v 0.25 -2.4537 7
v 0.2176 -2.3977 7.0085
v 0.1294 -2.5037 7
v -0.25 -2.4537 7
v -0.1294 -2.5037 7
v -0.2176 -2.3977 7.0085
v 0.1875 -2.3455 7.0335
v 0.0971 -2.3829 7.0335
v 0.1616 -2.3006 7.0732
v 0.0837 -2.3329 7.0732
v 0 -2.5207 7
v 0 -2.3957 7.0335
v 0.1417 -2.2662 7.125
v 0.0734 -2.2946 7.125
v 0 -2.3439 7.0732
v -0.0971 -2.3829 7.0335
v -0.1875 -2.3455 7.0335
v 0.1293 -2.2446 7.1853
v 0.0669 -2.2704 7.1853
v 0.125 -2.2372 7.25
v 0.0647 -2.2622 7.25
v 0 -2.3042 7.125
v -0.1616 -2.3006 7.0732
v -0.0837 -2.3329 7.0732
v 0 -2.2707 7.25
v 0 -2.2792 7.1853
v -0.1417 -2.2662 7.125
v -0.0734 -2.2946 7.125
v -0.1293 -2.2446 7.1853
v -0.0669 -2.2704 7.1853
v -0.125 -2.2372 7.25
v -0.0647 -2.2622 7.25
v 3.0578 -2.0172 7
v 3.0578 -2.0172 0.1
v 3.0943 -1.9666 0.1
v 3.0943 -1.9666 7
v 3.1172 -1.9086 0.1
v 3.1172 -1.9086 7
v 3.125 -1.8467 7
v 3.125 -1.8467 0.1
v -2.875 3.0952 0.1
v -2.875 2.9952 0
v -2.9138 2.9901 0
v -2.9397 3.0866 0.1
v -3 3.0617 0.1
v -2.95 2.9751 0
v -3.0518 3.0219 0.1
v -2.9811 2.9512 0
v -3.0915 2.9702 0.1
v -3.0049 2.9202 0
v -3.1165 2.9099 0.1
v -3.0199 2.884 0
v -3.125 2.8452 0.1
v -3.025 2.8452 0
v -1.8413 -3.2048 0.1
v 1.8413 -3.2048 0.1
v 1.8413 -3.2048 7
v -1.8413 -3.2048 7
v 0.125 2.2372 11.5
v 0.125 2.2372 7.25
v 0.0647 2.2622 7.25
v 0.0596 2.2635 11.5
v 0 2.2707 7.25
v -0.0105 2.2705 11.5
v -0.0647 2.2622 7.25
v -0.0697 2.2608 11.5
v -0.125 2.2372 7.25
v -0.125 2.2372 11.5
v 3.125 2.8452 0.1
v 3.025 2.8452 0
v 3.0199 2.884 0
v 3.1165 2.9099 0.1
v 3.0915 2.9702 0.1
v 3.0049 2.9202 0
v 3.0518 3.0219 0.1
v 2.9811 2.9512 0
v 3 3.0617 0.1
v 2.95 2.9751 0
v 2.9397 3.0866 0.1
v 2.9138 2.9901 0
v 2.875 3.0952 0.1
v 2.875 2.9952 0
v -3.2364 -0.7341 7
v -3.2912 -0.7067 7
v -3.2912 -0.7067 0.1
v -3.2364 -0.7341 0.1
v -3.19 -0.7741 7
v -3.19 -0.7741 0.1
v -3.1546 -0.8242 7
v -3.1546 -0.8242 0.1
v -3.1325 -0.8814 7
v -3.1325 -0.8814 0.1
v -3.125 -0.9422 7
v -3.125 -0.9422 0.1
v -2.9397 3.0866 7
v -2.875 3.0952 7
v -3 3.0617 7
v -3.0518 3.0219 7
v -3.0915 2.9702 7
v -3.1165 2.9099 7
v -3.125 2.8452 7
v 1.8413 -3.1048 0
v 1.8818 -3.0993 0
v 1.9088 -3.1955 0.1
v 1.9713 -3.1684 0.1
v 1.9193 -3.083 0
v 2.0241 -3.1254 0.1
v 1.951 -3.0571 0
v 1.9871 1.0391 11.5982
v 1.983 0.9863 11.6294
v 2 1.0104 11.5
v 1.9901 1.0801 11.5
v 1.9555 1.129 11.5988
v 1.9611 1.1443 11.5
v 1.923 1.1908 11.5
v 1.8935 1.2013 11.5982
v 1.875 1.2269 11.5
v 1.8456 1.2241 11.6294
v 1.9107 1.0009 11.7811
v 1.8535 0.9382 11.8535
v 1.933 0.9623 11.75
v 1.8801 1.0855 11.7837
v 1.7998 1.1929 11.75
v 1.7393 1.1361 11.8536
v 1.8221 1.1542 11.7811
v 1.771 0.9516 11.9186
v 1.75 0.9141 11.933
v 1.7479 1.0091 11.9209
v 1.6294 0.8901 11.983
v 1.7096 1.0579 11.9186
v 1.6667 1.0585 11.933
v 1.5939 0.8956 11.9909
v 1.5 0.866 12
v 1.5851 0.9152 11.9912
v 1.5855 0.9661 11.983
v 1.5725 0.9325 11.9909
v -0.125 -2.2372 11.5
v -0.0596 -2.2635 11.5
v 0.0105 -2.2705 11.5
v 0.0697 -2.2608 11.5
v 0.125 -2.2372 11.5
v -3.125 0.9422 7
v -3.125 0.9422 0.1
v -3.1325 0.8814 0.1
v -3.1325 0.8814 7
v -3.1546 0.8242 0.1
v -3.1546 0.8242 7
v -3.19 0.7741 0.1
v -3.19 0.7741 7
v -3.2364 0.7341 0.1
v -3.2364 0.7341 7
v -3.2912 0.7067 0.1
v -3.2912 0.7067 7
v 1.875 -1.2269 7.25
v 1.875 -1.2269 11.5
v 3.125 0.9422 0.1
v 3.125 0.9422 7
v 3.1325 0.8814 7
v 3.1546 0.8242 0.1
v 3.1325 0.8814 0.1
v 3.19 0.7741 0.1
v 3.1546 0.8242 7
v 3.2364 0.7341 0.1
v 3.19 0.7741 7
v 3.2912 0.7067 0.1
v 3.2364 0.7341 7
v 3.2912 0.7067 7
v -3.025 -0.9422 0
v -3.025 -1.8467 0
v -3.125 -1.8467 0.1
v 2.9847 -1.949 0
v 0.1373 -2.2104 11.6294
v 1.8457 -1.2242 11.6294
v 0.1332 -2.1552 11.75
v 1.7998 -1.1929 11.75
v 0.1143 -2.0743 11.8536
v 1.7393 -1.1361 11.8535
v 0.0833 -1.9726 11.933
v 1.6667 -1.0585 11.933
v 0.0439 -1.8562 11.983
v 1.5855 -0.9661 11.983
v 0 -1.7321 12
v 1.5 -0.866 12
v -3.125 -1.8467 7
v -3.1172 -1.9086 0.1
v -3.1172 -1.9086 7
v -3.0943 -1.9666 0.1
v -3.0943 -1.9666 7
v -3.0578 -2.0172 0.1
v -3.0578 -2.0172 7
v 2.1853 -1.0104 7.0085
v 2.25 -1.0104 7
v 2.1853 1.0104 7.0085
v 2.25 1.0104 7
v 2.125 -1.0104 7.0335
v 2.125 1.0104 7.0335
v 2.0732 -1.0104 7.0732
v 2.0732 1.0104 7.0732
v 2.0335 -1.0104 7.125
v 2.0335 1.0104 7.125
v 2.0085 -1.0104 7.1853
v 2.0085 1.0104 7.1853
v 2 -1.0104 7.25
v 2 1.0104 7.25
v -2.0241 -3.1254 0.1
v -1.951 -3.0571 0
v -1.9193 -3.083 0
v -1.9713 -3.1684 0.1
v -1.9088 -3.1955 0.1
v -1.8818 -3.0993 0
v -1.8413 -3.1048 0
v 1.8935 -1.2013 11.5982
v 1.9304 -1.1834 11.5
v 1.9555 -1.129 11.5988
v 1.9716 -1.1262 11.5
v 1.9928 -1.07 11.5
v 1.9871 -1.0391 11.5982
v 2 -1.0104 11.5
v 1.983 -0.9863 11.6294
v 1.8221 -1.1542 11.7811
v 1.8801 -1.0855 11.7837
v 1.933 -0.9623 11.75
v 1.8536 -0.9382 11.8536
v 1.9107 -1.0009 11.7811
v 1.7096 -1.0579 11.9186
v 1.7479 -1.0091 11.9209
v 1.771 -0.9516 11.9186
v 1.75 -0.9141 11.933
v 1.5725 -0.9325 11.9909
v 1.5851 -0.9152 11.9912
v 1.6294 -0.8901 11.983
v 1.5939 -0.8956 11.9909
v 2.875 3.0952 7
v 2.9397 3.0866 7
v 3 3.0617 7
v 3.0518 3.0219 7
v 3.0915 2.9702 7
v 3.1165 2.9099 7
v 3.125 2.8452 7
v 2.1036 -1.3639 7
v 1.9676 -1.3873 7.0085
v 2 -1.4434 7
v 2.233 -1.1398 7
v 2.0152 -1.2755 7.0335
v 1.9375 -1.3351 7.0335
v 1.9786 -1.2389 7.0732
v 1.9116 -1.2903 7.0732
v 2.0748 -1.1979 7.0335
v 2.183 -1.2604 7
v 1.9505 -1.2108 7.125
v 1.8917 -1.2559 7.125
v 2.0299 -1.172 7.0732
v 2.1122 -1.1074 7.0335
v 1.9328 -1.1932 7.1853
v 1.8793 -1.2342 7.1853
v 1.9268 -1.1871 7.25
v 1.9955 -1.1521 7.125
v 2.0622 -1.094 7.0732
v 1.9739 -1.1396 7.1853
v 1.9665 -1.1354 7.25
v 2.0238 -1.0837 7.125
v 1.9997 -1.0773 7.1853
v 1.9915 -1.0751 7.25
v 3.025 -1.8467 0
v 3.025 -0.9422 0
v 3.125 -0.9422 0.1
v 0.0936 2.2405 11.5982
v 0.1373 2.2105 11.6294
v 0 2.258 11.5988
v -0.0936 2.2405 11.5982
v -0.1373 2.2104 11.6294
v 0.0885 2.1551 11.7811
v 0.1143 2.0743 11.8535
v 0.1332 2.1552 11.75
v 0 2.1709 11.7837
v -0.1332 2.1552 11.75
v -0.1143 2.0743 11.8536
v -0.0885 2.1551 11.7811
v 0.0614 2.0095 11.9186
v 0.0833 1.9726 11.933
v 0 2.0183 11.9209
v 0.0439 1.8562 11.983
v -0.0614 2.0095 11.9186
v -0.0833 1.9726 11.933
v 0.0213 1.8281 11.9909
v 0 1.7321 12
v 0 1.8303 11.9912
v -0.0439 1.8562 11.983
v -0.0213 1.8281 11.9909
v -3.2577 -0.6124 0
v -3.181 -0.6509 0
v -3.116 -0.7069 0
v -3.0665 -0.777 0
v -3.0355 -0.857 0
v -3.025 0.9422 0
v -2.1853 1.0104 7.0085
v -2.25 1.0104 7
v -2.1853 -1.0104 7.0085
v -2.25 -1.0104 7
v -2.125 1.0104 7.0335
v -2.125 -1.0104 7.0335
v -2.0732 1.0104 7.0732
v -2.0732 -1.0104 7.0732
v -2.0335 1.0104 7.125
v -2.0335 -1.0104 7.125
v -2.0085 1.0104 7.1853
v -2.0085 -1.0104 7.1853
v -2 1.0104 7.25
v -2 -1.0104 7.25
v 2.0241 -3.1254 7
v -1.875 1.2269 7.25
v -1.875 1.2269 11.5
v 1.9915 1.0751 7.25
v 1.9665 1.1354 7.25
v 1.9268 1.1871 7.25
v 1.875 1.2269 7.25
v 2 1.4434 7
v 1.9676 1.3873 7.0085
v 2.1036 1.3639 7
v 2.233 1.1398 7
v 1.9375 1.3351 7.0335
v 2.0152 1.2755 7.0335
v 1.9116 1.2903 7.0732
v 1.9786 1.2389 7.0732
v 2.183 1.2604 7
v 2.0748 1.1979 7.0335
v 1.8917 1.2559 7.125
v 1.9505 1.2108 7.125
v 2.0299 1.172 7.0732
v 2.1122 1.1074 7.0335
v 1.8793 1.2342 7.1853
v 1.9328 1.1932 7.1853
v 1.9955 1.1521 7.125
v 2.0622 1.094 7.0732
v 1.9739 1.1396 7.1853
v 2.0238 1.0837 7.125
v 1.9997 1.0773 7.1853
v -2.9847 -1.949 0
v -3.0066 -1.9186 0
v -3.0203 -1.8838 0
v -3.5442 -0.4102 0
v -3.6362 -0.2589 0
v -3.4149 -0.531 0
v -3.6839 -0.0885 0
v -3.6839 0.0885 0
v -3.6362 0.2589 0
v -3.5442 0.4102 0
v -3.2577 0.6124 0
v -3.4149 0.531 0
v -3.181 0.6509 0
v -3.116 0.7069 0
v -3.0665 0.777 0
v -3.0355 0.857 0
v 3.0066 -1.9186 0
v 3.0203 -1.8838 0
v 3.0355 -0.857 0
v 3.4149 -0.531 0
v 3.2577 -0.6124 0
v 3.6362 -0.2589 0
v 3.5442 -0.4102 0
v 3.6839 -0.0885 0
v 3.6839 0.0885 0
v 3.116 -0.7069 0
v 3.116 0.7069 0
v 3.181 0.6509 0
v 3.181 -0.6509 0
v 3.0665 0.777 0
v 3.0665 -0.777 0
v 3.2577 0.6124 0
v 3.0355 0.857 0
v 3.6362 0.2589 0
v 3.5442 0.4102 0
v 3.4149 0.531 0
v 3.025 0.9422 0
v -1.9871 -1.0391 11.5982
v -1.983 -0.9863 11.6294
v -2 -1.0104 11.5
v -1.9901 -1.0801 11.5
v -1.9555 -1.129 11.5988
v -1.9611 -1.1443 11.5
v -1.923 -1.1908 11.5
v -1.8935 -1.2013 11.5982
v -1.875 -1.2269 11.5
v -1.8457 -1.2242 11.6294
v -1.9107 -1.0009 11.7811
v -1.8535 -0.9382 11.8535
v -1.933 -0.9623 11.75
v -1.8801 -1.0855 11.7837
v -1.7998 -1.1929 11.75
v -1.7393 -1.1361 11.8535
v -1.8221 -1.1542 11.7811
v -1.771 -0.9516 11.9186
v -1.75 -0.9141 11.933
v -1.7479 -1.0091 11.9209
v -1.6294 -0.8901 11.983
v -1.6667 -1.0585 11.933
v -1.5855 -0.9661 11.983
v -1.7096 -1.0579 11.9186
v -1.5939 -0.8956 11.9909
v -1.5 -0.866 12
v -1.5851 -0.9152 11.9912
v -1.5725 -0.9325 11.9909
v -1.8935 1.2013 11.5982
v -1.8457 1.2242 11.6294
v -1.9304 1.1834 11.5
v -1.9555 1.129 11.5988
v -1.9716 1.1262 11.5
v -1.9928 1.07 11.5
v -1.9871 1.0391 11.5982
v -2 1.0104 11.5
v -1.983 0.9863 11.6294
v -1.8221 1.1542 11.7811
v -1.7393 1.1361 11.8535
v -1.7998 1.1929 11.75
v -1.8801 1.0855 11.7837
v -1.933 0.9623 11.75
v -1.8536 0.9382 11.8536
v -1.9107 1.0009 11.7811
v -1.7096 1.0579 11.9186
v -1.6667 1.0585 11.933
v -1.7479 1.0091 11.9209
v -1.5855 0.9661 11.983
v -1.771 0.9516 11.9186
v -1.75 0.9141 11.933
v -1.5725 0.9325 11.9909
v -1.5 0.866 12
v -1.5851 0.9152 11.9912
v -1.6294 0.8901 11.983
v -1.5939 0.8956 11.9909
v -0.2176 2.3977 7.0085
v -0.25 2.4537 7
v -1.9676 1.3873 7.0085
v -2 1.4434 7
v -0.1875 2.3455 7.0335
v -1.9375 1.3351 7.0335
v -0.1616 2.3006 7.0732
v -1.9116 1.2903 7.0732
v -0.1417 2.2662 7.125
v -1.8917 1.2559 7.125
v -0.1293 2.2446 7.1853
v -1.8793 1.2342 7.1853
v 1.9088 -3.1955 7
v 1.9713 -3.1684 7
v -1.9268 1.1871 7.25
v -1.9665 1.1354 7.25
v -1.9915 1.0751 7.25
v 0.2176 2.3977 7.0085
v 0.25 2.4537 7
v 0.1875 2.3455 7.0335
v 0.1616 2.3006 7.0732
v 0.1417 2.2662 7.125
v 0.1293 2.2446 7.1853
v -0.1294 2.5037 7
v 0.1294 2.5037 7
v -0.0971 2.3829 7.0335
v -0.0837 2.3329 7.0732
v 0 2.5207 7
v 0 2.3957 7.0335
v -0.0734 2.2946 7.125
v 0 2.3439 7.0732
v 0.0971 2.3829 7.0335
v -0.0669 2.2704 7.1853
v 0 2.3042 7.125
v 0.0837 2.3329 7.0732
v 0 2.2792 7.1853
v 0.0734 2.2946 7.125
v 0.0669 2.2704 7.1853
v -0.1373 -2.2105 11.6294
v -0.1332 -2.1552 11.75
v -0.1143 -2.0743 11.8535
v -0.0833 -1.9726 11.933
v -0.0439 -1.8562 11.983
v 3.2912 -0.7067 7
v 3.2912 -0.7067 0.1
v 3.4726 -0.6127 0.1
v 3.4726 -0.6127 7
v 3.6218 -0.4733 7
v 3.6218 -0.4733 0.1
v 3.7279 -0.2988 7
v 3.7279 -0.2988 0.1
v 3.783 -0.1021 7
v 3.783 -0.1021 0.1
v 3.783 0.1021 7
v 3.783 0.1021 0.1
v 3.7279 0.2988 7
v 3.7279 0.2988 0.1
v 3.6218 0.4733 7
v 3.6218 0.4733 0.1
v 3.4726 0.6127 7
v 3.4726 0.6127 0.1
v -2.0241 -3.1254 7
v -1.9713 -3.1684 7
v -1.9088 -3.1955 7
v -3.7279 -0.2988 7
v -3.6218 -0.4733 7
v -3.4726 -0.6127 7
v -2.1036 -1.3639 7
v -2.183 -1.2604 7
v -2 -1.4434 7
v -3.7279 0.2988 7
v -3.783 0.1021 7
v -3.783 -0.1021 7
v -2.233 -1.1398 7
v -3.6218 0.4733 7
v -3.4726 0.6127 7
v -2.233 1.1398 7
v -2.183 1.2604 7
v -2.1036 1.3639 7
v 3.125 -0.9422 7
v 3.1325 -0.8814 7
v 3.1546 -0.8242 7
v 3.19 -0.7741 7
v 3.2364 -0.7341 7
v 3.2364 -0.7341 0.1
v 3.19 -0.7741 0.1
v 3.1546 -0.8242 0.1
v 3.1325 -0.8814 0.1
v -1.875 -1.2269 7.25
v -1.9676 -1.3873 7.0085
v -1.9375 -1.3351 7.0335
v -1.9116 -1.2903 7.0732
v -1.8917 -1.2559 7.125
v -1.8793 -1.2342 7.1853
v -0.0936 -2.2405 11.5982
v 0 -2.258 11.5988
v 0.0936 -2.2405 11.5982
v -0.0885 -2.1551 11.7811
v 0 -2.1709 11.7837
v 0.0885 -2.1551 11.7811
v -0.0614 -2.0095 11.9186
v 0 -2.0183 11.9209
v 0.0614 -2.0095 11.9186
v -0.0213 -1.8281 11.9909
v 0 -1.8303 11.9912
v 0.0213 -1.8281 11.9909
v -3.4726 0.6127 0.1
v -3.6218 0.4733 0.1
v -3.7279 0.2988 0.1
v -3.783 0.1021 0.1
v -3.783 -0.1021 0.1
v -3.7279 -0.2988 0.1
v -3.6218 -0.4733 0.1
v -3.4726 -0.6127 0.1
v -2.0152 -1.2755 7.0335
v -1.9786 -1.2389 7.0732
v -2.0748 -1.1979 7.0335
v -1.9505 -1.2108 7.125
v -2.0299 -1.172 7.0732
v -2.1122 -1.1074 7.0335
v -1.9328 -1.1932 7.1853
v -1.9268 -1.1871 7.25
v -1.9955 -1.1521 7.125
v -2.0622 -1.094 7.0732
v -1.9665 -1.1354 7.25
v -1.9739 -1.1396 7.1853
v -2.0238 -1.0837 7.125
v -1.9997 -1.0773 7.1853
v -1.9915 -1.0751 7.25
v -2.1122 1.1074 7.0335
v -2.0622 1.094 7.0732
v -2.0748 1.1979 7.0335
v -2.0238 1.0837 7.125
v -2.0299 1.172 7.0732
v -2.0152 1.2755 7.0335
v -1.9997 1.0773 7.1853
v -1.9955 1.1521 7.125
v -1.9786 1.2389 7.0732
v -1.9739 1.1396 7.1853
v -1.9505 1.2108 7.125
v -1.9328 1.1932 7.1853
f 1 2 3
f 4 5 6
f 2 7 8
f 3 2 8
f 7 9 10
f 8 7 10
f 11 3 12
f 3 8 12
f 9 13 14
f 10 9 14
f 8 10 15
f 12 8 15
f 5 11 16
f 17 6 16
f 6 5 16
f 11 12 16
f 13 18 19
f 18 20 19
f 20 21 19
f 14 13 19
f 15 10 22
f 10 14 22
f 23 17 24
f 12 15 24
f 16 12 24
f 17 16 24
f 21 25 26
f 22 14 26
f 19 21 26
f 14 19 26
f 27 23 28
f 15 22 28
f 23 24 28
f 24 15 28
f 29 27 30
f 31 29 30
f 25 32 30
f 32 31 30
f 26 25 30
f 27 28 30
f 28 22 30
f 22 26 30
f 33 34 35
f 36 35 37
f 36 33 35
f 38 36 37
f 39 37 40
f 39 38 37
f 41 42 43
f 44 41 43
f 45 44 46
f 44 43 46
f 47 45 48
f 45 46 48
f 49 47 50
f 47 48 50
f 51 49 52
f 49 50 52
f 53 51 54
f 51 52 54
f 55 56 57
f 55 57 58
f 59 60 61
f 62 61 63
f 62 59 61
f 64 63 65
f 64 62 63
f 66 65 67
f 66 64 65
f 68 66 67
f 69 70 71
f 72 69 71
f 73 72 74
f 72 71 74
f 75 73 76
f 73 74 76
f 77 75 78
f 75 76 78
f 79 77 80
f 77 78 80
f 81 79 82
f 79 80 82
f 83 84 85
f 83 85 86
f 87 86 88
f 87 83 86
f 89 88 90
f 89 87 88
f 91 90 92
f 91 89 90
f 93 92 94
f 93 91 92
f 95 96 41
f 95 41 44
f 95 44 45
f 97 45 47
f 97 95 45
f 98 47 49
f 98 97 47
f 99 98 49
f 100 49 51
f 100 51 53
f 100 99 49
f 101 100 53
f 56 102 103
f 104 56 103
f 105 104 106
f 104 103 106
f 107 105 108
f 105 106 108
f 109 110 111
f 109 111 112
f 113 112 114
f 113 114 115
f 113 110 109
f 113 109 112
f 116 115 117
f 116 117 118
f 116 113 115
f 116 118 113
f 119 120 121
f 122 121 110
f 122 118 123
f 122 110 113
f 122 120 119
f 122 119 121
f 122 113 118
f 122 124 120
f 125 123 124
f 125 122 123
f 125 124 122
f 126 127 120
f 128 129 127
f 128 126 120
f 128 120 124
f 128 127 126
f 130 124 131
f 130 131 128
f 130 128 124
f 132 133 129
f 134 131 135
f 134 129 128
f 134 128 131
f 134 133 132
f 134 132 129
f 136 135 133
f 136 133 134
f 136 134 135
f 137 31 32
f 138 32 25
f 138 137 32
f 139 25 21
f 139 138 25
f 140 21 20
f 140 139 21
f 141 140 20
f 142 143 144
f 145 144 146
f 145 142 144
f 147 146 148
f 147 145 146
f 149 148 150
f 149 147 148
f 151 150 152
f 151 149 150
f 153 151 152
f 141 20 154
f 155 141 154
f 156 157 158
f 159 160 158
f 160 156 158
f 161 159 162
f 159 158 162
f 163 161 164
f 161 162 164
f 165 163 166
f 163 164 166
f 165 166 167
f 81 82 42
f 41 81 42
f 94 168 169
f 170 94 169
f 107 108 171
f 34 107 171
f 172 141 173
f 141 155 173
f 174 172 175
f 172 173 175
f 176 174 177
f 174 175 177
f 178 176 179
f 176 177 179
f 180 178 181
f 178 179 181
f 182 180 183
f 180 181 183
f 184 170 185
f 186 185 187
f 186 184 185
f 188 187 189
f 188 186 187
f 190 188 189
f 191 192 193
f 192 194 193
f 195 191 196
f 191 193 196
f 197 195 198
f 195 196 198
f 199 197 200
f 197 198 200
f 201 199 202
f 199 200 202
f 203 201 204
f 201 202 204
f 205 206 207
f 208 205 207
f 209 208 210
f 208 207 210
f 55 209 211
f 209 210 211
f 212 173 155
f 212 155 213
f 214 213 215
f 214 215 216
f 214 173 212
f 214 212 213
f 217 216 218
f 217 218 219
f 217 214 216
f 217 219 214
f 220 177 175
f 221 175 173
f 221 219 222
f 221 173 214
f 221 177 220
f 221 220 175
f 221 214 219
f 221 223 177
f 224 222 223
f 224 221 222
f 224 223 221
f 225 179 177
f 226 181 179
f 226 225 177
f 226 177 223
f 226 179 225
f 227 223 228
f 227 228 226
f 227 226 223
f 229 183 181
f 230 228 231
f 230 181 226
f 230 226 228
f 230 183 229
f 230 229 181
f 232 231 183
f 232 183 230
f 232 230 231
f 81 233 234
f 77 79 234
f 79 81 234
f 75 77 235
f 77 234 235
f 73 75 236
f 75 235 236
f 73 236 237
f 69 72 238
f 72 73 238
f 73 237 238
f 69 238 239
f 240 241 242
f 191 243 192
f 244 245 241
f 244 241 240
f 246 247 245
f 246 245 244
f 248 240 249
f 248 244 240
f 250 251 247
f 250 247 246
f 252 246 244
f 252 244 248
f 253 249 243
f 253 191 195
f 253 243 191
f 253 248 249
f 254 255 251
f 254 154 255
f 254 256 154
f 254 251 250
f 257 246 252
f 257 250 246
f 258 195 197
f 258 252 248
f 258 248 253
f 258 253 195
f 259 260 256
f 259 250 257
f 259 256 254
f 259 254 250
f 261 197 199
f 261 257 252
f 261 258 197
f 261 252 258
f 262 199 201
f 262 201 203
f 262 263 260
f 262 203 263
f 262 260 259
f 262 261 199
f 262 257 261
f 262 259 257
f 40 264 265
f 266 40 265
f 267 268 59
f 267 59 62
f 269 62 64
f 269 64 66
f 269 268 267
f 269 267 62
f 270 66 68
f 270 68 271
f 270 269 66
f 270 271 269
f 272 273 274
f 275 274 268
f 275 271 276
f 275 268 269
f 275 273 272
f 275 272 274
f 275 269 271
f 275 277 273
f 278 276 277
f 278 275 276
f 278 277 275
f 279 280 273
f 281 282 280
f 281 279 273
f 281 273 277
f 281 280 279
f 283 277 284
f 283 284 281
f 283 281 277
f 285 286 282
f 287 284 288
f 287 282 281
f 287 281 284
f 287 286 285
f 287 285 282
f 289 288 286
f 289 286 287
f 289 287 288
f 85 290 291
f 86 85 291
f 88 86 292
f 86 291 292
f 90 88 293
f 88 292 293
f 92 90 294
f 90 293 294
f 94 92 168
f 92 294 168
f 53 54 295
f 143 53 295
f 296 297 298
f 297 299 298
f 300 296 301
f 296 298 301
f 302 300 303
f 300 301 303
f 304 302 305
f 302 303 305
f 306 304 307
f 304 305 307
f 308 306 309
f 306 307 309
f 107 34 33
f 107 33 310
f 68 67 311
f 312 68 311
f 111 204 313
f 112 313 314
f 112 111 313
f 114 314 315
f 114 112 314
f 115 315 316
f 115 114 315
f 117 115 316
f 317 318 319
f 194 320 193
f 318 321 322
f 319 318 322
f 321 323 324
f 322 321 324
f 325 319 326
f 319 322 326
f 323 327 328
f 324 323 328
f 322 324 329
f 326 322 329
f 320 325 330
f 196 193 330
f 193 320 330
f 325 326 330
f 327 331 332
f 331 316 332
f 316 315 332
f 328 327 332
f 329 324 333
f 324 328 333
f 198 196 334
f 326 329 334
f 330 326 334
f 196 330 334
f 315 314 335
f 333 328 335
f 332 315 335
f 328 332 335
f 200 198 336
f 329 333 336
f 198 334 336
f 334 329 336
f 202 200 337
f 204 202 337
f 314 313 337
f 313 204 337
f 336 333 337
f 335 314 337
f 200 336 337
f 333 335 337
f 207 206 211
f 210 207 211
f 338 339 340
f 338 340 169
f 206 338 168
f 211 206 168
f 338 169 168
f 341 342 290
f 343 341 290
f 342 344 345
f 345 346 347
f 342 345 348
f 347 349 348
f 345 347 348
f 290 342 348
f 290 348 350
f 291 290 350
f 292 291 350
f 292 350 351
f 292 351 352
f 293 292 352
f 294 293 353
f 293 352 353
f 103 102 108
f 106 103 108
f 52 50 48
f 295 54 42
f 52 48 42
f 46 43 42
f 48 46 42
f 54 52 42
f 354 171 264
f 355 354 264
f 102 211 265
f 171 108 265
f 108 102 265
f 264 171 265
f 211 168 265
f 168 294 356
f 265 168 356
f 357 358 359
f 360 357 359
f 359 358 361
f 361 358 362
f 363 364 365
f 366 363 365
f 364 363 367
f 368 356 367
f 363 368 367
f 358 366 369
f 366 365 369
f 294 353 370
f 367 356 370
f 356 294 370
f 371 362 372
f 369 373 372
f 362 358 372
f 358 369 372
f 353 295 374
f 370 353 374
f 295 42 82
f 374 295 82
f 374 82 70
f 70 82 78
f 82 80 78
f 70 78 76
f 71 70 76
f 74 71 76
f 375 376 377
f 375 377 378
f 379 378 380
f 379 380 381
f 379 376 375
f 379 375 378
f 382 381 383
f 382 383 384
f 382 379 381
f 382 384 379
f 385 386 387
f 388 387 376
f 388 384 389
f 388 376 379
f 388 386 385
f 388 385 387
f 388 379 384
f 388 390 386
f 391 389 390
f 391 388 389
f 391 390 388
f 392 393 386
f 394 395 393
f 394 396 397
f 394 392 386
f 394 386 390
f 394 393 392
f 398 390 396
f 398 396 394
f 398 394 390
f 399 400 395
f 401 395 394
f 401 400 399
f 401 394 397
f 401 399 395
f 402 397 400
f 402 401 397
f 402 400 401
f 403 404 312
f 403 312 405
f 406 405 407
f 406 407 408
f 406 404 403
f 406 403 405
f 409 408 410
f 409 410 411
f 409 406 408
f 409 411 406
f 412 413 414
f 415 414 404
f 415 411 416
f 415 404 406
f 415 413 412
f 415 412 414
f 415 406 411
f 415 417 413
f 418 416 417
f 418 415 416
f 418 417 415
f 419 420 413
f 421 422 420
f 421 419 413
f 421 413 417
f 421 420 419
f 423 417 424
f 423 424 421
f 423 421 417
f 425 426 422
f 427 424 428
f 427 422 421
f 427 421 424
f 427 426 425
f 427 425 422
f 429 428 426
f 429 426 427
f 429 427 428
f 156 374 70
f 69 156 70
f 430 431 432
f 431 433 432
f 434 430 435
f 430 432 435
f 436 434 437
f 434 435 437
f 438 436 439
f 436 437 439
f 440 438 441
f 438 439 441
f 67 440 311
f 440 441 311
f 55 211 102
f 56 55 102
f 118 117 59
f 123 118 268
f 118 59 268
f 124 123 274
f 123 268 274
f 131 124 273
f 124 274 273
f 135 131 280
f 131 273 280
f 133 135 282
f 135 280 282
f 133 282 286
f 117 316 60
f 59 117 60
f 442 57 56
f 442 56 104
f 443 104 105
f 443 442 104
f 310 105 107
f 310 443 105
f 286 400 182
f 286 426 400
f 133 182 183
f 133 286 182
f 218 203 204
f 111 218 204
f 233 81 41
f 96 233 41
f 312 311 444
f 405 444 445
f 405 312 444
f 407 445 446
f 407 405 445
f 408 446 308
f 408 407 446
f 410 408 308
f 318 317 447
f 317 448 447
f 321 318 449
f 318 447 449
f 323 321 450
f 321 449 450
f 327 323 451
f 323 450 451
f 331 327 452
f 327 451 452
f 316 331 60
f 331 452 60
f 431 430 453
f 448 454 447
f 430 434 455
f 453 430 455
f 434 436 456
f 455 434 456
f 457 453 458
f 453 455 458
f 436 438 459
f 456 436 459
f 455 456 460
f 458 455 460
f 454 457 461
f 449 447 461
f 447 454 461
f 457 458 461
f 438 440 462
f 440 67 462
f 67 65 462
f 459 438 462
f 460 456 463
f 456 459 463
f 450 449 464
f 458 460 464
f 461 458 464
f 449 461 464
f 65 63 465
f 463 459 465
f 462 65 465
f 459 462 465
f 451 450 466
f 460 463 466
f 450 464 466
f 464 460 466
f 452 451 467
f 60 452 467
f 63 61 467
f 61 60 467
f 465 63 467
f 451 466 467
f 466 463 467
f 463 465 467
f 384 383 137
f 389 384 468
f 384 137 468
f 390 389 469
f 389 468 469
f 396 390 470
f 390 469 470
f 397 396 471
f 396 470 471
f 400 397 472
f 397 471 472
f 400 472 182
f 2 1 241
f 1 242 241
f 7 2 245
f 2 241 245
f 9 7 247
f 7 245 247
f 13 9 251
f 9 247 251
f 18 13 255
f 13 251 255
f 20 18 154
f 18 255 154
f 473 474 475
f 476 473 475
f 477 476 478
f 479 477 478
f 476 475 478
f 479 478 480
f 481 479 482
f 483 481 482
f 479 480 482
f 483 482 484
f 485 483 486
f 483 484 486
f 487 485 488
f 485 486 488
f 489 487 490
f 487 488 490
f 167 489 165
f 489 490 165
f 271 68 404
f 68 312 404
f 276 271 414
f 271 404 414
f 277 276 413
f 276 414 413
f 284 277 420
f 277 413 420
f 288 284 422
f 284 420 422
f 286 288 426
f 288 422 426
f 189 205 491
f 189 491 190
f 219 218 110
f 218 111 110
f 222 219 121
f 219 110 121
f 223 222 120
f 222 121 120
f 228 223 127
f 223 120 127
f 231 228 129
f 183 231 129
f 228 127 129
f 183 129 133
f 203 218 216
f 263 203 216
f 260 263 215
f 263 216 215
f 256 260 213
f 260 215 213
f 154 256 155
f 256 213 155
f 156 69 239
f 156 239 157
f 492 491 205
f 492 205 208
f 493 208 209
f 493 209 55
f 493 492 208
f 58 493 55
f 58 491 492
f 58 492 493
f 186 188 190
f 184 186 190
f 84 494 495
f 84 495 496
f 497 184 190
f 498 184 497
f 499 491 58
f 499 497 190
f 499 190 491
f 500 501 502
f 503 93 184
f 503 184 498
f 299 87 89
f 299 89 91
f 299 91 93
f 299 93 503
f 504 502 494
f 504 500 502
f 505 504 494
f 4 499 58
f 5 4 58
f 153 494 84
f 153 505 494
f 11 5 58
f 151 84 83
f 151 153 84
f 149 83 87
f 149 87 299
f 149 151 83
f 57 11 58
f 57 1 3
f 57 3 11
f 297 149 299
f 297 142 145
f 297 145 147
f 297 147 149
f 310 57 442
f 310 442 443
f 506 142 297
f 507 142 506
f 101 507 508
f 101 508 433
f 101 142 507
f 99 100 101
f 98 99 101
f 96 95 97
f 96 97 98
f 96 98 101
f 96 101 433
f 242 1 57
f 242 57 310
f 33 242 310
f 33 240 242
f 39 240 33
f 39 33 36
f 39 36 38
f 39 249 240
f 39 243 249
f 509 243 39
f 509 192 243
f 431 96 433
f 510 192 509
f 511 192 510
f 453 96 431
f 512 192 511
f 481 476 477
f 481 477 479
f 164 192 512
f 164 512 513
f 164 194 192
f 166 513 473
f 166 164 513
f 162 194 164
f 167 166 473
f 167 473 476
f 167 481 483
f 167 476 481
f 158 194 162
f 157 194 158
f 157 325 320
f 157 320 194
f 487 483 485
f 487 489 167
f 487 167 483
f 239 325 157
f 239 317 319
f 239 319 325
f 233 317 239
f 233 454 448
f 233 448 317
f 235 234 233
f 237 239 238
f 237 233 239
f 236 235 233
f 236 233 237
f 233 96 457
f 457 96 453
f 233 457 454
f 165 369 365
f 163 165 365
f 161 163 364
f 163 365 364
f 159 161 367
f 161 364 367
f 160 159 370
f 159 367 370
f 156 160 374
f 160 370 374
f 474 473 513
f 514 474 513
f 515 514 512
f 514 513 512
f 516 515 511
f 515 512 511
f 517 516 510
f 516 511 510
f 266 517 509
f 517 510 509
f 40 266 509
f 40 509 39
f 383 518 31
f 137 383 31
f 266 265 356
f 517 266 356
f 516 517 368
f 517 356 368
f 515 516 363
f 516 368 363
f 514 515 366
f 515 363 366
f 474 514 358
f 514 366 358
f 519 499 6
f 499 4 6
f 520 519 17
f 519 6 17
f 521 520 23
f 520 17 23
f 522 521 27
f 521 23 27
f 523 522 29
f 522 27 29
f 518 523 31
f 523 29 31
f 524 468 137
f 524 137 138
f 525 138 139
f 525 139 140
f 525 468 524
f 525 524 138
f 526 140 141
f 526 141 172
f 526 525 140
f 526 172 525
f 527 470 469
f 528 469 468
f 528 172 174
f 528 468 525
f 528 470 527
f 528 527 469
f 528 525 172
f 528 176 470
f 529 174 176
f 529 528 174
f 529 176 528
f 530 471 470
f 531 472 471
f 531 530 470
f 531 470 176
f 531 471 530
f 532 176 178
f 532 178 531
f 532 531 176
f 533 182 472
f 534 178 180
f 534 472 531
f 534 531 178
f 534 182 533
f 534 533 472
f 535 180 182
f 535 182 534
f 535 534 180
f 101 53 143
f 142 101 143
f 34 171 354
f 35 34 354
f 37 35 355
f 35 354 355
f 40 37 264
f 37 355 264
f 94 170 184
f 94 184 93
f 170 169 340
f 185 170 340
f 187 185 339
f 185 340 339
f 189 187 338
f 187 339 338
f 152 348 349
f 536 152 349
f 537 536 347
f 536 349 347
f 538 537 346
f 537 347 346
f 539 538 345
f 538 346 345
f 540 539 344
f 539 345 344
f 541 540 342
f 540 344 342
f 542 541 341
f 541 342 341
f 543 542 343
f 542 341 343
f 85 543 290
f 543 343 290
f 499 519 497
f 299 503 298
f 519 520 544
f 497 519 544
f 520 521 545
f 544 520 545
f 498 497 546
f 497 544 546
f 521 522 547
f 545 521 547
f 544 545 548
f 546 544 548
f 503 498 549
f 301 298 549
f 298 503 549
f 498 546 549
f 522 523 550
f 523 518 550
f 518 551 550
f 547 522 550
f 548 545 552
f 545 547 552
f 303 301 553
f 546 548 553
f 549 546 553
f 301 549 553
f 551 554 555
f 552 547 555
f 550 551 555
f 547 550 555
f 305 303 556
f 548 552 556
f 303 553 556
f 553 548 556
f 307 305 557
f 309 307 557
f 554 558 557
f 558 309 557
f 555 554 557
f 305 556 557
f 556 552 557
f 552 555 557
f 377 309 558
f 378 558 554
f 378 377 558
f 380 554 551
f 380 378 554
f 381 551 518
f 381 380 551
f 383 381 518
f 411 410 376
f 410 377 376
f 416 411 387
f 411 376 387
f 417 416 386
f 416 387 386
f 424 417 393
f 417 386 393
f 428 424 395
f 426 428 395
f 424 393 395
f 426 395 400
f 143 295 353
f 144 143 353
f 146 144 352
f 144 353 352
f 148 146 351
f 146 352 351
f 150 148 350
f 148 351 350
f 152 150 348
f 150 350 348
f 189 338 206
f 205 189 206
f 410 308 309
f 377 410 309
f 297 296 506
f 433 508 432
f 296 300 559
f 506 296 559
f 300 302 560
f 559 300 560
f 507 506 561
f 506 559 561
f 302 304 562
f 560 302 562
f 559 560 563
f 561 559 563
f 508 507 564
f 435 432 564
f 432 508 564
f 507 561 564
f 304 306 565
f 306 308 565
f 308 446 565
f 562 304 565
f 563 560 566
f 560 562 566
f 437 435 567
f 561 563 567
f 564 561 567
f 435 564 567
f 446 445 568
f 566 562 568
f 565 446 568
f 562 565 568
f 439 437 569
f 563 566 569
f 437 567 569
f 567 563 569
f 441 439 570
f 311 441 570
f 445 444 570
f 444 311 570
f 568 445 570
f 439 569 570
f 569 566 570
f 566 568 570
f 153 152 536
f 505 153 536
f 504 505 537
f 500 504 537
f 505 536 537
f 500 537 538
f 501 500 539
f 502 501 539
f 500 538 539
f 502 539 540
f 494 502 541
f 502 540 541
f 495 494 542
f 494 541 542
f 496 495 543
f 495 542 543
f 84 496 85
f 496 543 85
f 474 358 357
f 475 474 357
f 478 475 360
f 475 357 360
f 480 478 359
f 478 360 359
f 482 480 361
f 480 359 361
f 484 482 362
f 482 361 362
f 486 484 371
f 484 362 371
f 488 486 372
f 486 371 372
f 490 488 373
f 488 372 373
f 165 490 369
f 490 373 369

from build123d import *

# Parameters (mm, degrees)
PAD013_DEPTH    = 7
PAD014_DEPTH    = 5
FILLET018_R     = 0.25
FILLET019_R     = 0.5
CHAMFER001_SIZE = 0.1


with BuildPart() as part:
    # Sketch035 → Pad013 (new body)
    with BuildSketch(Plane.XY):
        with BuildLine():
            Line((3.125, 3.095168), (-3.125, 3.095168))
            Line((-3.125, 3.095168), (-3.125, 0.745168))
            ThreePointArc((-3.125, 0.745168), (-3.79, 0), (-3.125, -0.745168))
            Line((-3.125, -1.945168), (-3.125, -0.745168))
            Line((-1.95, -3.204832), (-3.125, -1.945168))
            Line((1.95, -3.204832), (-1.95, -3.204832))
            Line((3.125, -1.945168), (1.95, -3.204832))
            Line((3.125, -0.745168), (3.125, -1.945168))
            ThreePointArc((3.125, -0.745168), (3.79, 0), (3.125, 0.745168))
            Line((3.125, 3.095168), (3.125, 0.745168))
        make_face()
    extrude(amount=PAD013_DEPTH)

    # Sketch036 (on Face12 of Pad013) → Pad014 (join)
    with BuildSketch(Plane.XY.offset(7)):
        Polygon((2, -1.154701), (2, 1.154701), (0, 2.309401), (-2, 1.154701), (-2, -1.154701), (0, -2.309401), align=None)
    extrude(amount=PAD014_DEPTH)

    # Fillet018
    fillet018_edges = [part.edges().sort_by_distance(p)[0] for p in [
        (1.95, -3.204832, 3.5),
        (3.125, -1.945168, 3.5),
        (-1.95, -3.204832, 3.5),
        (-3.125, -1.945168, 3.5),
        (-3.125, -0.745168, 3.5),
        (-3.125, 0.745168, 3.5),
        (-3.125, 3.095168, 3.5),
        (3.125, 3.095168, 3.5),
        (3.125, 0.745168, 3.5),
        (3.125, -0.745168, 3.5),
        (2, -1.154701, 9.5),
        (2, 1.154701, 9.5),
        (0, -2.309401, 9.5),
        (-2, -1.154701, 9.5),
        (-2, 1.154701, 9.5),
        (0, 2.309401, 9.5),
        (1, -1.732051, 7),
        (-1, -1.732051, 7),
        (-2, 0, 7),
        (-1, 1.732051, 7),
        (1, 1.732051, 7),
        (2, 0, 7),
    ]]
    fillet(fillet018_edges, radius=FILLET018_R)

    # Fillet019
    fillet019_edges = [part.edges().sort_by_distance(p)[0] for p in [
        (-1, -1.732051, 12),
        (0, -2.270726, 12),
        (1, -1.732051, 12),
        (1.966506, -1.135363, 12),
        (2, 0, 12),
        (1.966506, 1.135363, 12),
        (1, 1.732051, 12),
        (0, 2.270726, 12),
        (-1, 1.732051, 12),
        (-1.966506, 1.135363, 12),
        (-2, 0, 12),
        (-1.966506, -1.135363, 12),
    ]]
    fillet(fillet019_edges, radius=FILLET019_R)

    # Chamfer001
    chamfer001_edges = [part.edges().sort_by_distance(p)[0] for p in [
        (-3.125, 1.893693, 0),
        (-3.051777, 3.021944, 0),
        (0, 3.095168, 0),
        (3.051777, 3.021944, 0),
        (3.125, 1.893693, 0),
        (3.170748, 0.798061, 0),
        (3.79, 0, 0),
        (3.170748, -0.798061, 0),
        (3.125, -1.394444, 0),
        (3.107598, -1.938311, 0),
        (2.540973, -2.571277, 0),
        (1.940989, -3.184105, 0),
        (0, -3.204832, 0),
        (-1.940989, -3.184105, 0),
        (-2.540973, -2.571277, 0),
        (-3.107598, -1.938311, 0),
        (-3.125, -1.394444, 0),
        (-3.170748, -0.798061, 0),
        (-3.79, 0, 0),
        (-3.170748, 0.798061, 0),
    ]]
    chamfer(chamfer001_edges, length=CHAMFER001_SIZE)


solid = part.part
